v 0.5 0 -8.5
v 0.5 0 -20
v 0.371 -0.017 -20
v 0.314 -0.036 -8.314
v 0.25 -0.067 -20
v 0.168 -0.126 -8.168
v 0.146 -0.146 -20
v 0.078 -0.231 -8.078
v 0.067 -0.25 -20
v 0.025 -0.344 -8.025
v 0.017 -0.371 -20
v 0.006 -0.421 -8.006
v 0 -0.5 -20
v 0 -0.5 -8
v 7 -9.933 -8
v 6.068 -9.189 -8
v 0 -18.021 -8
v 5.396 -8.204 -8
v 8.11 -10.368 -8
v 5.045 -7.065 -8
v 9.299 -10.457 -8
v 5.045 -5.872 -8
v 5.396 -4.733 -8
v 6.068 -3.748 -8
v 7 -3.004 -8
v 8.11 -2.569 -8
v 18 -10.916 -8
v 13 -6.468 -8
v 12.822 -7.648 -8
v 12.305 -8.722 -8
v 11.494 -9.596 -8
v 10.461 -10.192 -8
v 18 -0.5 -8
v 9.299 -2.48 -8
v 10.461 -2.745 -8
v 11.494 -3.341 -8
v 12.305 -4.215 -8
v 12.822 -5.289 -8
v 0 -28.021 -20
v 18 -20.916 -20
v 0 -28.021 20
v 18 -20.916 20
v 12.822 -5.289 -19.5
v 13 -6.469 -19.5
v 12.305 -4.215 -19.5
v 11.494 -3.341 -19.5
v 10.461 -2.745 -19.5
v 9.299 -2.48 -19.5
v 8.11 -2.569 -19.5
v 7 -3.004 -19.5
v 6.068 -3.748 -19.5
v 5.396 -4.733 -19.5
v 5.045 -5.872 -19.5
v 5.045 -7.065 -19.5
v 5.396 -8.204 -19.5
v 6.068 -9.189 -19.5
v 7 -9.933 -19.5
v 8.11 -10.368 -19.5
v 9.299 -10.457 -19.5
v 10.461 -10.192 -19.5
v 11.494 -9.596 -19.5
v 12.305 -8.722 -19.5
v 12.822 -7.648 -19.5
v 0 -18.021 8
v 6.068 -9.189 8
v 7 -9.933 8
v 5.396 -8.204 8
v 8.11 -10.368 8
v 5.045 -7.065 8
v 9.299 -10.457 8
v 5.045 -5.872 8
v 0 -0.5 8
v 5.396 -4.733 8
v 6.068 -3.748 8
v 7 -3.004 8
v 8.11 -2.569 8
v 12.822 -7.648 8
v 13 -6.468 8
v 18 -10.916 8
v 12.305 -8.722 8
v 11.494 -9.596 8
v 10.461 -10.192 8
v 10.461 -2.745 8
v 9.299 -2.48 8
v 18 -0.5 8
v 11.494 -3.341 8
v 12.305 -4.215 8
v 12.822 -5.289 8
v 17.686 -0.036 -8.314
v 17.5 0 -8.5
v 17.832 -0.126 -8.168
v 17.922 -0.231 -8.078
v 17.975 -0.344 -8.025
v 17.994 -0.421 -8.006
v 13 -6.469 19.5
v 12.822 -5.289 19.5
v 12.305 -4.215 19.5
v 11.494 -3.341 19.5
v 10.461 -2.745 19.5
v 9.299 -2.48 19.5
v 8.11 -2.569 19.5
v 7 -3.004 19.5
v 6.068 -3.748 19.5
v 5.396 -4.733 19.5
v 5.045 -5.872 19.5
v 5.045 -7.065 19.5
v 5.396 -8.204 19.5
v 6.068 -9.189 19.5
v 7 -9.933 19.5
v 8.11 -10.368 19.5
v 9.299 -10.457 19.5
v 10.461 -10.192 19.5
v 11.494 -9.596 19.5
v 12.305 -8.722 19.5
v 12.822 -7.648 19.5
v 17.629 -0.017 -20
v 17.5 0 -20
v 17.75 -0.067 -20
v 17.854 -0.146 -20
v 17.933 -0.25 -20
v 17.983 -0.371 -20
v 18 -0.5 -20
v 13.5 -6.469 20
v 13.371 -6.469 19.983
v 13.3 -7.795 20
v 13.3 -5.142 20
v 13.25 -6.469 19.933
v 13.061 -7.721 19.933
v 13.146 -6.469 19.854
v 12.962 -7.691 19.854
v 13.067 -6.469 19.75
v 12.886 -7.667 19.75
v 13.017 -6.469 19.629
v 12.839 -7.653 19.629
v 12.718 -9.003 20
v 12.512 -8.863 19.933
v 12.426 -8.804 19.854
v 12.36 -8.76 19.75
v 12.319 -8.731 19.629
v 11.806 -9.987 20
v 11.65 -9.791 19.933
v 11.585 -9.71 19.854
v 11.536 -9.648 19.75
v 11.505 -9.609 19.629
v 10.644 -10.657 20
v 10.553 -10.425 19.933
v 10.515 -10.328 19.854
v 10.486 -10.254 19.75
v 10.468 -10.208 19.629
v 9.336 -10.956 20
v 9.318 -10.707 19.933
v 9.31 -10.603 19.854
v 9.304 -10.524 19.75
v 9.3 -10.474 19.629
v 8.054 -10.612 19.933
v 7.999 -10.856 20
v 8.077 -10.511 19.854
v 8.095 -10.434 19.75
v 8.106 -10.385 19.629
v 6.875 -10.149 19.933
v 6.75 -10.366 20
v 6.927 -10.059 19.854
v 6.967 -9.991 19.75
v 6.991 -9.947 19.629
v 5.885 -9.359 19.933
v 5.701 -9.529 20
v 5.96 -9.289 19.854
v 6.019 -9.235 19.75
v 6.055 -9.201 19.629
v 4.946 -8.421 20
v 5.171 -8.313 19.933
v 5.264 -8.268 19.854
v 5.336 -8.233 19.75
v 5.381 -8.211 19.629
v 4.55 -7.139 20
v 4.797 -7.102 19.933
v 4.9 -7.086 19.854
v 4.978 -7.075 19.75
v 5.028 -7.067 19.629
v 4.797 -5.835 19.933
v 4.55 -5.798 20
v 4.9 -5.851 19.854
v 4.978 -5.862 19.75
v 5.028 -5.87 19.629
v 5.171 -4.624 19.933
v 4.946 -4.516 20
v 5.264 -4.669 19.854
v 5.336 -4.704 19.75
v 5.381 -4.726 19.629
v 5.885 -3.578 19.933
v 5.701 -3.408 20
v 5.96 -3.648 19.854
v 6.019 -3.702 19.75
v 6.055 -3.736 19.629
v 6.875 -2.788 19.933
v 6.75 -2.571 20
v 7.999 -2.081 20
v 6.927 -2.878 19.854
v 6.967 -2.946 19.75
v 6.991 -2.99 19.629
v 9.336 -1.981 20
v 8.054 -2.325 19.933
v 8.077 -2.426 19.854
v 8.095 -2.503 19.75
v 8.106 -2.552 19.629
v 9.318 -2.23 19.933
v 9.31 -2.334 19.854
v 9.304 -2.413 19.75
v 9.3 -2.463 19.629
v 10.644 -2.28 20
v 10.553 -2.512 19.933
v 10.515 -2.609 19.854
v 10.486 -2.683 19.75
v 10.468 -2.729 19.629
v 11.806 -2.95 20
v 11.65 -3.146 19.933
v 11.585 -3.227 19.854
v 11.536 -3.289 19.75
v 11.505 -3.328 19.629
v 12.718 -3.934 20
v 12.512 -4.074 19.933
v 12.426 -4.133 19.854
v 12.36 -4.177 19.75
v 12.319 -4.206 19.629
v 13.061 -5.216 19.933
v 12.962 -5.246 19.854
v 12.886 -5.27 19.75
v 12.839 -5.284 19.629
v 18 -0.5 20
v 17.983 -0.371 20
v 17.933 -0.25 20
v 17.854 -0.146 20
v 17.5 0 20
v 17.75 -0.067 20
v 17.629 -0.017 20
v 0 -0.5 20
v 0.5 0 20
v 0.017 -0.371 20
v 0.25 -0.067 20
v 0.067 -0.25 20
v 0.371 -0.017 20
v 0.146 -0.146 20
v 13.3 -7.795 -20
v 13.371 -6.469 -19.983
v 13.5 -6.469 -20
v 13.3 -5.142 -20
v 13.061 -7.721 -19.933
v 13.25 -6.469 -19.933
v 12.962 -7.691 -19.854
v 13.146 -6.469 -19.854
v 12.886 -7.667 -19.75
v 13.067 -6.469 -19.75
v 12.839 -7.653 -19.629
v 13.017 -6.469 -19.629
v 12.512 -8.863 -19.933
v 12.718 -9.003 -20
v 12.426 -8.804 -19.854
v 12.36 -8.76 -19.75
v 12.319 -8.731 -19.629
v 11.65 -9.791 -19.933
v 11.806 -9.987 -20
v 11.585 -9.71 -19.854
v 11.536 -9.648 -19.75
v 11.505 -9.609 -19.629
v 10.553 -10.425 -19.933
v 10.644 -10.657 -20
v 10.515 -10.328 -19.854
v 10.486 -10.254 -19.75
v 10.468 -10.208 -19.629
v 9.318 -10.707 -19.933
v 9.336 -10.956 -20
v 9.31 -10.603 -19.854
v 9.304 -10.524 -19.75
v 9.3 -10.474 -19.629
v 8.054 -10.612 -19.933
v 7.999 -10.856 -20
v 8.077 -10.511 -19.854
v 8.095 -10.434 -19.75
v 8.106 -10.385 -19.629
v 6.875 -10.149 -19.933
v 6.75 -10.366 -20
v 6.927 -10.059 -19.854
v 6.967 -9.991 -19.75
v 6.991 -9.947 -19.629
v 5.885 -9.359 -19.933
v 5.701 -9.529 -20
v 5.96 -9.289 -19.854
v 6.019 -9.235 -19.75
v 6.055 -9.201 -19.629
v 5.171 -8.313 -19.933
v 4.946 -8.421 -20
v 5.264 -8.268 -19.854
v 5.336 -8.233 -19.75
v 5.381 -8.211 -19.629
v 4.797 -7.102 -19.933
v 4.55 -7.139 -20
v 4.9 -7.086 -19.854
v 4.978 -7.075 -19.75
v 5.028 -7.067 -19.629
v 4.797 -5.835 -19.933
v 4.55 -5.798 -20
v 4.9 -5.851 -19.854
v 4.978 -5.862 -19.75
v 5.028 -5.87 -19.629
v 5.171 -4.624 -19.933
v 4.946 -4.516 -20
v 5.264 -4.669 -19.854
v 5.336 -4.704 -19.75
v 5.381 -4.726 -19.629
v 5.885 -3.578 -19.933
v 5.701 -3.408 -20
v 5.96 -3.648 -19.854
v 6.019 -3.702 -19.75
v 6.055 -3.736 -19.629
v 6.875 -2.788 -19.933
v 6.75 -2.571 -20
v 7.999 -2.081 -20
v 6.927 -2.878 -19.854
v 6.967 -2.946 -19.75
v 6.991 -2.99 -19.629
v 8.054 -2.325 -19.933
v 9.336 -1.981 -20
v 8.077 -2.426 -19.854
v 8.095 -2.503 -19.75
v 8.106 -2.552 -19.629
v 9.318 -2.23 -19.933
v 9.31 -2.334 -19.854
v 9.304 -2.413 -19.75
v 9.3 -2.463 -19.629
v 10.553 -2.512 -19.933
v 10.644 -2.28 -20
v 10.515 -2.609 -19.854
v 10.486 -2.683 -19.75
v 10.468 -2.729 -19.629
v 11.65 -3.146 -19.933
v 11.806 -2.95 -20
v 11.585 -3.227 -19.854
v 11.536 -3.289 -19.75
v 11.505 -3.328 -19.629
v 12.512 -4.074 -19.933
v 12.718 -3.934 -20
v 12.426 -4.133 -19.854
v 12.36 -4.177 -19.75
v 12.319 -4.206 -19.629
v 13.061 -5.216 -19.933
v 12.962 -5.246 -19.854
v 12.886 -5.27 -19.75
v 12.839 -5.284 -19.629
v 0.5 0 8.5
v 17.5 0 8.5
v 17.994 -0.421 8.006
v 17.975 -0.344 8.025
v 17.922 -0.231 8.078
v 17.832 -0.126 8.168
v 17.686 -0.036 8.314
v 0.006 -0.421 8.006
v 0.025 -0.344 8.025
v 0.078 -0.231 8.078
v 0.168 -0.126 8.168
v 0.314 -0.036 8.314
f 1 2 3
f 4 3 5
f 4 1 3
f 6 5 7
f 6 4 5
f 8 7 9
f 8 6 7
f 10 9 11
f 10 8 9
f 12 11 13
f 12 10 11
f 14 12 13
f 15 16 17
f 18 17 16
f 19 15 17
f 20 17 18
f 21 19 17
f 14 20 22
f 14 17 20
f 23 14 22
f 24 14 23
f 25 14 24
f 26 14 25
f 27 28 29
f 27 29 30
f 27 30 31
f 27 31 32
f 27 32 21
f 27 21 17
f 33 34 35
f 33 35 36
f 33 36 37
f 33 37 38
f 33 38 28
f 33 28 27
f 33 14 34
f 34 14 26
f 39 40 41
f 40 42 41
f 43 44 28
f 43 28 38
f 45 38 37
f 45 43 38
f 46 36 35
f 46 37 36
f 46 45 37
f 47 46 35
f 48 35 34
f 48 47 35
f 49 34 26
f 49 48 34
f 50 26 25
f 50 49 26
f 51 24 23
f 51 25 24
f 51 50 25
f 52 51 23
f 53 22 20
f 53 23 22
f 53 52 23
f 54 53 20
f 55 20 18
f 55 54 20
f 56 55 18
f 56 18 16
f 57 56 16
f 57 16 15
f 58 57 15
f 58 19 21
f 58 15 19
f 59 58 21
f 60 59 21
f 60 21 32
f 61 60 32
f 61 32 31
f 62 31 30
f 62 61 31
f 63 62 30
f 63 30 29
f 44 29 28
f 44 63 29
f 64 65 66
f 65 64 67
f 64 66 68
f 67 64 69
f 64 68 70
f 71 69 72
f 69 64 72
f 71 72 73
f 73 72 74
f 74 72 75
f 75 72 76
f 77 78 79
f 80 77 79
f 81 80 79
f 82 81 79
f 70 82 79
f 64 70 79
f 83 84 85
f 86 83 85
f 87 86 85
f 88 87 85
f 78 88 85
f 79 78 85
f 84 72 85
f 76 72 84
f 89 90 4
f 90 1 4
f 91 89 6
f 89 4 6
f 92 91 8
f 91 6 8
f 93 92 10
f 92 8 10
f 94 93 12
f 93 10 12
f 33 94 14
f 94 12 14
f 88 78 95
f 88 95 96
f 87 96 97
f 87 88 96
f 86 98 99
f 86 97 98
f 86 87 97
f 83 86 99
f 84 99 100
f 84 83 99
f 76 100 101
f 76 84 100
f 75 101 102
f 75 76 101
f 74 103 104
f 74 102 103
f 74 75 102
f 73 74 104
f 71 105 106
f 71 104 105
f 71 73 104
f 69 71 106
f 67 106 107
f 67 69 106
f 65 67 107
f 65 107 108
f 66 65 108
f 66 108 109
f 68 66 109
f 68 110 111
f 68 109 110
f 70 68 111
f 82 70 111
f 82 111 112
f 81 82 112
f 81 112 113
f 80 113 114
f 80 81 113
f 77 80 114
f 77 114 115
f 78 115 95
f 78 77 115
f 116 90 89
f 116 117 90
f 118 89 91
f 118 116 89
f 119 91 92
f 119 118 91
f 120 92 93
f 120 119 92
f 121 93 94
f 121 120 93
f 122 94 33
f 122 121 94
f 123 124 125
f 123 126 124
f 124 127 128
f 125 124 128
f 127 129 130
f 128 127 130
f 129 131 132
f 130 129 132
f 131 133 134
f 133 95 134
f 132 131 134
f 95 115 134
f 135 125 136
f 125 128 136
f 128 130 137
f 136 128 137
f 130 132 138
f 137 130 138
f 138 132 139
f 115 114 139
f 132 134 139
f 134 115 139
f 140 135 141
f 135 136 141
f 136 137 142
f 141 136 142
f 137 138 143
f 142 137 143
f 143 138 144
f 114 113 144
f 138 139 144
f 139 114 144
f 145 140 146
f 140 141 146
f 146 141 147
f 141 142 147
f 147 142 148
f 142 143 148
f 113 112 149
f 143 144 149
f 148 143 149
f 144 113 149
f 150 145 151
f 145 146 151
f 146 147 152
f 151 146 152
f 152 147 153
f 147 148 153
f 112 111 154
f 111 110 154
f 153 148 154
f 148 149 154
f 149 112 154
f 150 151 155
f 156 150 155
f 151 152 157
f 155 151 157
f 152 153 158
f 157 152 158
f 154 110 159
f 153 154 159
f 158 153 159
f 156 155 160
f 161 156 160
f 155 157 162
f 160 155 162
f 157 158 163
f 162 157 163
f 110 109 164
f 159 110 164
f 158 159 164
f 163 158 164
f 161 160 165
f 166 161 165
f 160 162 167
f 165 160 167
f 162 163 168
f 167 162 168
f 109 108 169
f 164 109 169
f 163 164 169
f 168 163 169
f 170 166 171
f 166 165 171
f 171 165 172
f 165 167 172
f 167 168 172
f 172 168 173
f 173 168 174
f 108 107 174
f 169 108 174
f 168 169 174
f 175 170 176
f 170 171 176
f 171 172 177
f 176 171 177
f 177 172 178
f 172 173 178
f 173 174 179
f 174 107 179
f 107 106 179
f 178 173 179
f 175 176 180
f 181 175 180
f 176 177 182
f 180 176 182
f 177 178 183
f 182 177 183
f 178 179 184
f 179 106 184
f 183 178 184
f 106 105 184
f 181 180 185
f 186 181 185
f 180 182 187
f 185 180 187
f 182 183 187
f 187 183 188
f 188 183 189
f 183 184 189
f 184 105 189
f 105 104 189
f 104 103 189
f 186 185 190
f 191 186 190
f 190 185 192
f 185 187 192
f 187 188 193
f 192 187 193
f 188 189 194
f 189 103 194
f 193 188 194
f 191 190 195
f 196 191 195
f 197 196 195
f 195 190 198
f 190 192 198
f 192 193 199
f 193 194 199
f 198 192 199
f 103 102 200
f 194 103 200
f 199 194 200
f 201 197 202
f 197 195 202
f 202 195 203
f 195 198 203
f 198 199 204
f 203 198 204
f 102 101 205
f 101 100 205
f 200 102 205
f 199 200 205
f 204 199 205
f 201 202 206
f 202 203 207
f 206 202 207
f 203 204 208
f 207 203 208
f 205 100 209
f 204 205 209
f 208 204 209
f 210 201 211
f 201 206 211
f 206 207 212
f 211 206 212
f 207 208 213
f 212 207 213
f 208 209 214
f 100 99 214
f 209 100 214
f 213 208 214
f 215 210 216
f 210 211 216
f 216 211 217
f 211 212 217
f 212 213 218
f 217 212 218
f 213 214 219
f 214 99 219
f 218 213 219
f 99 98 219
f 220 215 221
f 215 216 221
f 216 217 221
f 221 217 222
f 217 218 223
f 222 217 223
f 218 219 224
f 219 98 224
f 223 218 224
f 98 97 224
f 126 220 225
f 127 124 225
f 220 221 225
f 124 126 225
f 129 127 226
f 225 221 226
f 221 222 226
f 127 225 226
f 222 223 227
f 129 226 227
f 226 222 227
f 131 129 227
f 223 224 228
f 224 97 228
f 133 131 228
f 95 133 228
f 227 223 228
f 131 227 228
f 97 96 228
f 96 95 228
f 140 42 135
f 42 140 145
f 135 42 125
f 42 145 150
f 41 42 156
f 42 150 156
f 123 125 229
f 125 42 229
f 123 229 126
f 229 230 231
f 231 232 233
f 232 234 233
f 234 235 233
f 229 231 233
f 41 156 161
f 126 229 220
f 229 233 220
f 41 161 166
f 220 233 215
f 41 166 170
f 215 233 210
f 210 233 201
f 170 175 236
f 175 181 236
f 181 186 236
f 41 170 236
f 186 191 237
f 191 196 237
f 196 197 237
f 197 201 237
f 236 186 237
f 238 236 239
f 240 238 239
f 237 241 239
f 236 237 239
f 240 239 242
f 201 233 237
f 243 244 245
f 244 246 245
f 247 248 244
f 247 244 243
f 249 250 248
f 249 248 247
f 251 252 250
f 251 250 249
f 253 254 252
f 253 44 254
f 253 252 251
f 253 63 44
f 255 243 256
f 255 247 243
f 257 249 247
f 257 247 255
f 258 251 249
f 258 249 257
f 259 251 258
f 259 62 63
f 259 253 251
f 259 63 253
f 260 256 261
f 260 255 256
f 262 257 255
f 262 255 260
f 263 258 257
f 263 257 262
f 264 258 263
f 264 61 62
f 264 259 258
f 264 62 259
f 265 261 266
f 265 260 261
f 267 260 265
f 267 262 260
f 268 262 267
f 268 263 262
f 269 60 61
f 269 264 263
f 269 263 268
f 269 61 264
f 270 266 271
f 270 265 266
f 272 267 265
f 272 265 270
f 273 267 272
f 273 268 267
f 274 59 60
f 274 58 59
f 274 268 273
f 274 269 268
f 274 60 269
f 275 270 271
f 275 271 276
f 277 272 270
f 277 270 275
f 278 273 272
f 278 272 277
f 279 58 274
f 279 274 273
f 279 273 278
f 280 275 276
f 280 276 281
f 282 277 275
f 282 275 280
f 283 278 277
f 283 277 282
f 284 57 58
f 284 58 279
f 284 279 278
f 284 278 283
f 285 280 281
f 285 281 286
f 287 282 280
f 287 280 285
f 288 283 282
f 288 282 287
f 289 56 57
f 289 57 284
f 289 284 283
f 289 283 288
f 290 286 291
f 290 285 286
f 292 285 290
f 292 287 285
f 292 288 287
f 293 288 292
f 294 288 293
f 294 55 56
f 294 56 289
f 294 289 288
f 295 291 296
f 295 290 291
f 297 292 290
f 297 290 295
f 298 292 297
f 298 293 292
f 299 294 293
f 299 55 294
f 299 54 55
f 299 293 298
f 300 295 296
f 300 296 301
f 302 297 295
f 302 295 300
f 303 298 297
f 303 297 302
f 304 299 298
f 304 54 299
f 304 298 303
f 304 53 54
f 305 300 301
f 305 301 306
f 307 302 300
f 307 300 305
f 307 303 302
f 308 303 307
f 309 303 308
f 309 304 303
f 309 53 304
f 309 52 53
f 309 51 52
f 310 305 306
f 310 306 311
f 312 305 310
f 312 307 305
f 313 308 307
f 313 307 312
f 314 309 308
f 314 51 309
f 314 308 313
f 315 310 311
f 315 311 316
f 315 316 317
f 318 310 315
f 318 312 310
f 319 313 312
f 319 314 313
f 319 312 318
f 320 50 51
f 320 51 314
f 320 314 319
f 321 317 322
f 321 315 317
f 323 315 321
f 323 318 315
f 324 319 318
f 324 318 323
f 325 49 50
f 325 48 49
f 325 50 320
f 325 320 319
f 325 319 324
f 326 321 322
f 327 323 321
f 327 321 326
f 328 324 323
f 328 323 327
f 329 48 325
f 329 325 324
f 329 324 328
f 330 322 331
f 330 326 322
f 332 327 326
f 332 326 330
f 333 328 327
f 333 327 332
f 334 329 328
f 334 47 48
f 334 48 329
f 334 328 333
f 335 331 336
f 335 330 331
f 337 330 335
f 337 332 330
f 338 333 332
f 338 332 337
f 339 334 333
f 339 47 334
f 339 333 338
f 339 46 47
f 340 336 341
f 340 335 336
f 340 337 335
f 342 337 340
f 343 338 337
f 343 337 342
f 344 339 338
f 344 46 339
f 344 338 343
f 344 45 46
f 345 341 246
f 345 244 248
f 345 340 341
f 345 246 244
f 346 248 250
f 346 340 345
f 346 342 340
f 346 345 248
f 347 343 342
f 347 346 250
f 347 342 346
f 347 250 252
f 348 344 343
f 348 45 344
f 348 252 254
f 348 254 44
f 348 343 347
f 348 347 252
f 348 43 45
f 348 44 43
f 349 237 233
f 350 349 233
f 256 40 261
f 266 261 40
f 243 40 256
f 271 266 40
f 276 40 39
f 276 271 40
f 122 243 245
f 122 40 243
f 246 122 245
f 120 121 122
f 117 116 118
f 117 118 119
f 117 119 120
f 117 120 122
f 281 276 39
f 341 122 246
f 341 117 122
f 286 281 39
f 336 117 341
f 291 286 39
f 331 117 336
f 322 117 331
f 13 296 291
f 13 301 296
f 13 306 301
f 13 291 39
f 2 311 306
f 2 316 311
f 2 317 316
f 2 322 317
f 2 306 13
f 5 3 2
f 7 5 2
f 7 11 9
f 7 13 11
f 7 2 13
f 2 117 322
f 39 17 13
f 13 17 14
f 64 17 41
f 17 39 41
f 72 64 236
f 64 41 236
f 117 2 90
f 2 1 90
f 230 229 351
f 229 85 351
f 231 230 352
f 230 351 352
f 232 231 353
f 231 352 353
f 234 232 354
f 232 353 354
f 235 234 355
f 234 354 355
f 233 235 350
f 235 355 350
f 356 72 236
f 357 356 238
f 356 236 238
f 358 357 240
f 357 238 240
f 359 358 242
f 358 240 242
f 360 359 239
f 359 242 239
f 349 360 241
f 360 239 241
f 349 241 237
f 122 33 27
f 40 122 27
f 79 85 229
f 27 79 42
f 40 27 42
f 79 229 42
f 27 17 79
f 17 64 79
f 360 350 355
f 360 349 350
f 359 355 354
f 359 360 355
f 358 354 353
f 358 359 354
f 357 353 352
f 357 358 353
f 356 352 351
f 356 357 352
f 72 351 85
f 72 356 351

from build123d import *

# Parameters (mm, degrees)
EXTRUDE_1_DEPTH          = 20
CUT_EXTRUDE_1_DEPTH      = 8
FILLET_1_R               = 0.5
CUT_EXTRUDE_2_DEPTH      = 44.510647444
CUT_EXTRUDE_2_DEPTH_BACK = 44.510647444
SKETCH_5_R               = 4
FILLET_2_R               = 0.5


with BuildPart() as part:
    # 스케치1 → 보스-돌출1 (new, symmetric)
    with BuildSketch(Plane.XY):
        Polygon((0, 0), (18, 0), (18, -20.916), (0, -28.021), align=None)
    extrude(amount=EXTRUDE_1_DEPTH, both=True)

    # 스케치2 → 컷-돌출1 (cut, symmetric)
    with BuildSketch(Plane.XY):
        Polygon((0, -18.021), (18, -10.916), (18, 0), (0, 0), align=None)
    extrude(amount=CUT_EXTRUDE_1_DEPTH, both=True, mode=Mode.SUBTRACT)

    # 필렛1
    fillet_1_edges = [part.edges().sort_by_distance(p)[0] for p in [
        (0, 0, -14),
        (18, 0, -14),
        (9, 0, -8),
        (9, 0, 8),
        (0, 0, 14),
        (18, 0, 14),
    ]]
    fillet(fillet_1_edges, radius=FILLET_1_R)

    # 스케치5 → 컷-돌출2 (cut, two sides: drawn at the far end of the back side and taken through both)
    with BuildSketch(Plane.XY.offset(-8).offset(-CUT_EXTRUDE_2_DEPTH_BACK)):
        with Locations((9, -6.4685)):
            Circle(SKETCH_5_R)
    extrude(amount=CUT_EXTRUDE_2_DEPTH + CUT_EXTRUDE_2_DEPTH_BACK, mode=Mode.SUBTRACT)

    # 필렛2
    fillet_2_edges = [part.edges().sort_by_distance(p)[0] for p in [
        (5, -6.4685, -20),
        (5, -6.4685, 20),
    ]]
    fillet(fillet_2_edges, radius=FILLET_2_R)


solid = part.part
